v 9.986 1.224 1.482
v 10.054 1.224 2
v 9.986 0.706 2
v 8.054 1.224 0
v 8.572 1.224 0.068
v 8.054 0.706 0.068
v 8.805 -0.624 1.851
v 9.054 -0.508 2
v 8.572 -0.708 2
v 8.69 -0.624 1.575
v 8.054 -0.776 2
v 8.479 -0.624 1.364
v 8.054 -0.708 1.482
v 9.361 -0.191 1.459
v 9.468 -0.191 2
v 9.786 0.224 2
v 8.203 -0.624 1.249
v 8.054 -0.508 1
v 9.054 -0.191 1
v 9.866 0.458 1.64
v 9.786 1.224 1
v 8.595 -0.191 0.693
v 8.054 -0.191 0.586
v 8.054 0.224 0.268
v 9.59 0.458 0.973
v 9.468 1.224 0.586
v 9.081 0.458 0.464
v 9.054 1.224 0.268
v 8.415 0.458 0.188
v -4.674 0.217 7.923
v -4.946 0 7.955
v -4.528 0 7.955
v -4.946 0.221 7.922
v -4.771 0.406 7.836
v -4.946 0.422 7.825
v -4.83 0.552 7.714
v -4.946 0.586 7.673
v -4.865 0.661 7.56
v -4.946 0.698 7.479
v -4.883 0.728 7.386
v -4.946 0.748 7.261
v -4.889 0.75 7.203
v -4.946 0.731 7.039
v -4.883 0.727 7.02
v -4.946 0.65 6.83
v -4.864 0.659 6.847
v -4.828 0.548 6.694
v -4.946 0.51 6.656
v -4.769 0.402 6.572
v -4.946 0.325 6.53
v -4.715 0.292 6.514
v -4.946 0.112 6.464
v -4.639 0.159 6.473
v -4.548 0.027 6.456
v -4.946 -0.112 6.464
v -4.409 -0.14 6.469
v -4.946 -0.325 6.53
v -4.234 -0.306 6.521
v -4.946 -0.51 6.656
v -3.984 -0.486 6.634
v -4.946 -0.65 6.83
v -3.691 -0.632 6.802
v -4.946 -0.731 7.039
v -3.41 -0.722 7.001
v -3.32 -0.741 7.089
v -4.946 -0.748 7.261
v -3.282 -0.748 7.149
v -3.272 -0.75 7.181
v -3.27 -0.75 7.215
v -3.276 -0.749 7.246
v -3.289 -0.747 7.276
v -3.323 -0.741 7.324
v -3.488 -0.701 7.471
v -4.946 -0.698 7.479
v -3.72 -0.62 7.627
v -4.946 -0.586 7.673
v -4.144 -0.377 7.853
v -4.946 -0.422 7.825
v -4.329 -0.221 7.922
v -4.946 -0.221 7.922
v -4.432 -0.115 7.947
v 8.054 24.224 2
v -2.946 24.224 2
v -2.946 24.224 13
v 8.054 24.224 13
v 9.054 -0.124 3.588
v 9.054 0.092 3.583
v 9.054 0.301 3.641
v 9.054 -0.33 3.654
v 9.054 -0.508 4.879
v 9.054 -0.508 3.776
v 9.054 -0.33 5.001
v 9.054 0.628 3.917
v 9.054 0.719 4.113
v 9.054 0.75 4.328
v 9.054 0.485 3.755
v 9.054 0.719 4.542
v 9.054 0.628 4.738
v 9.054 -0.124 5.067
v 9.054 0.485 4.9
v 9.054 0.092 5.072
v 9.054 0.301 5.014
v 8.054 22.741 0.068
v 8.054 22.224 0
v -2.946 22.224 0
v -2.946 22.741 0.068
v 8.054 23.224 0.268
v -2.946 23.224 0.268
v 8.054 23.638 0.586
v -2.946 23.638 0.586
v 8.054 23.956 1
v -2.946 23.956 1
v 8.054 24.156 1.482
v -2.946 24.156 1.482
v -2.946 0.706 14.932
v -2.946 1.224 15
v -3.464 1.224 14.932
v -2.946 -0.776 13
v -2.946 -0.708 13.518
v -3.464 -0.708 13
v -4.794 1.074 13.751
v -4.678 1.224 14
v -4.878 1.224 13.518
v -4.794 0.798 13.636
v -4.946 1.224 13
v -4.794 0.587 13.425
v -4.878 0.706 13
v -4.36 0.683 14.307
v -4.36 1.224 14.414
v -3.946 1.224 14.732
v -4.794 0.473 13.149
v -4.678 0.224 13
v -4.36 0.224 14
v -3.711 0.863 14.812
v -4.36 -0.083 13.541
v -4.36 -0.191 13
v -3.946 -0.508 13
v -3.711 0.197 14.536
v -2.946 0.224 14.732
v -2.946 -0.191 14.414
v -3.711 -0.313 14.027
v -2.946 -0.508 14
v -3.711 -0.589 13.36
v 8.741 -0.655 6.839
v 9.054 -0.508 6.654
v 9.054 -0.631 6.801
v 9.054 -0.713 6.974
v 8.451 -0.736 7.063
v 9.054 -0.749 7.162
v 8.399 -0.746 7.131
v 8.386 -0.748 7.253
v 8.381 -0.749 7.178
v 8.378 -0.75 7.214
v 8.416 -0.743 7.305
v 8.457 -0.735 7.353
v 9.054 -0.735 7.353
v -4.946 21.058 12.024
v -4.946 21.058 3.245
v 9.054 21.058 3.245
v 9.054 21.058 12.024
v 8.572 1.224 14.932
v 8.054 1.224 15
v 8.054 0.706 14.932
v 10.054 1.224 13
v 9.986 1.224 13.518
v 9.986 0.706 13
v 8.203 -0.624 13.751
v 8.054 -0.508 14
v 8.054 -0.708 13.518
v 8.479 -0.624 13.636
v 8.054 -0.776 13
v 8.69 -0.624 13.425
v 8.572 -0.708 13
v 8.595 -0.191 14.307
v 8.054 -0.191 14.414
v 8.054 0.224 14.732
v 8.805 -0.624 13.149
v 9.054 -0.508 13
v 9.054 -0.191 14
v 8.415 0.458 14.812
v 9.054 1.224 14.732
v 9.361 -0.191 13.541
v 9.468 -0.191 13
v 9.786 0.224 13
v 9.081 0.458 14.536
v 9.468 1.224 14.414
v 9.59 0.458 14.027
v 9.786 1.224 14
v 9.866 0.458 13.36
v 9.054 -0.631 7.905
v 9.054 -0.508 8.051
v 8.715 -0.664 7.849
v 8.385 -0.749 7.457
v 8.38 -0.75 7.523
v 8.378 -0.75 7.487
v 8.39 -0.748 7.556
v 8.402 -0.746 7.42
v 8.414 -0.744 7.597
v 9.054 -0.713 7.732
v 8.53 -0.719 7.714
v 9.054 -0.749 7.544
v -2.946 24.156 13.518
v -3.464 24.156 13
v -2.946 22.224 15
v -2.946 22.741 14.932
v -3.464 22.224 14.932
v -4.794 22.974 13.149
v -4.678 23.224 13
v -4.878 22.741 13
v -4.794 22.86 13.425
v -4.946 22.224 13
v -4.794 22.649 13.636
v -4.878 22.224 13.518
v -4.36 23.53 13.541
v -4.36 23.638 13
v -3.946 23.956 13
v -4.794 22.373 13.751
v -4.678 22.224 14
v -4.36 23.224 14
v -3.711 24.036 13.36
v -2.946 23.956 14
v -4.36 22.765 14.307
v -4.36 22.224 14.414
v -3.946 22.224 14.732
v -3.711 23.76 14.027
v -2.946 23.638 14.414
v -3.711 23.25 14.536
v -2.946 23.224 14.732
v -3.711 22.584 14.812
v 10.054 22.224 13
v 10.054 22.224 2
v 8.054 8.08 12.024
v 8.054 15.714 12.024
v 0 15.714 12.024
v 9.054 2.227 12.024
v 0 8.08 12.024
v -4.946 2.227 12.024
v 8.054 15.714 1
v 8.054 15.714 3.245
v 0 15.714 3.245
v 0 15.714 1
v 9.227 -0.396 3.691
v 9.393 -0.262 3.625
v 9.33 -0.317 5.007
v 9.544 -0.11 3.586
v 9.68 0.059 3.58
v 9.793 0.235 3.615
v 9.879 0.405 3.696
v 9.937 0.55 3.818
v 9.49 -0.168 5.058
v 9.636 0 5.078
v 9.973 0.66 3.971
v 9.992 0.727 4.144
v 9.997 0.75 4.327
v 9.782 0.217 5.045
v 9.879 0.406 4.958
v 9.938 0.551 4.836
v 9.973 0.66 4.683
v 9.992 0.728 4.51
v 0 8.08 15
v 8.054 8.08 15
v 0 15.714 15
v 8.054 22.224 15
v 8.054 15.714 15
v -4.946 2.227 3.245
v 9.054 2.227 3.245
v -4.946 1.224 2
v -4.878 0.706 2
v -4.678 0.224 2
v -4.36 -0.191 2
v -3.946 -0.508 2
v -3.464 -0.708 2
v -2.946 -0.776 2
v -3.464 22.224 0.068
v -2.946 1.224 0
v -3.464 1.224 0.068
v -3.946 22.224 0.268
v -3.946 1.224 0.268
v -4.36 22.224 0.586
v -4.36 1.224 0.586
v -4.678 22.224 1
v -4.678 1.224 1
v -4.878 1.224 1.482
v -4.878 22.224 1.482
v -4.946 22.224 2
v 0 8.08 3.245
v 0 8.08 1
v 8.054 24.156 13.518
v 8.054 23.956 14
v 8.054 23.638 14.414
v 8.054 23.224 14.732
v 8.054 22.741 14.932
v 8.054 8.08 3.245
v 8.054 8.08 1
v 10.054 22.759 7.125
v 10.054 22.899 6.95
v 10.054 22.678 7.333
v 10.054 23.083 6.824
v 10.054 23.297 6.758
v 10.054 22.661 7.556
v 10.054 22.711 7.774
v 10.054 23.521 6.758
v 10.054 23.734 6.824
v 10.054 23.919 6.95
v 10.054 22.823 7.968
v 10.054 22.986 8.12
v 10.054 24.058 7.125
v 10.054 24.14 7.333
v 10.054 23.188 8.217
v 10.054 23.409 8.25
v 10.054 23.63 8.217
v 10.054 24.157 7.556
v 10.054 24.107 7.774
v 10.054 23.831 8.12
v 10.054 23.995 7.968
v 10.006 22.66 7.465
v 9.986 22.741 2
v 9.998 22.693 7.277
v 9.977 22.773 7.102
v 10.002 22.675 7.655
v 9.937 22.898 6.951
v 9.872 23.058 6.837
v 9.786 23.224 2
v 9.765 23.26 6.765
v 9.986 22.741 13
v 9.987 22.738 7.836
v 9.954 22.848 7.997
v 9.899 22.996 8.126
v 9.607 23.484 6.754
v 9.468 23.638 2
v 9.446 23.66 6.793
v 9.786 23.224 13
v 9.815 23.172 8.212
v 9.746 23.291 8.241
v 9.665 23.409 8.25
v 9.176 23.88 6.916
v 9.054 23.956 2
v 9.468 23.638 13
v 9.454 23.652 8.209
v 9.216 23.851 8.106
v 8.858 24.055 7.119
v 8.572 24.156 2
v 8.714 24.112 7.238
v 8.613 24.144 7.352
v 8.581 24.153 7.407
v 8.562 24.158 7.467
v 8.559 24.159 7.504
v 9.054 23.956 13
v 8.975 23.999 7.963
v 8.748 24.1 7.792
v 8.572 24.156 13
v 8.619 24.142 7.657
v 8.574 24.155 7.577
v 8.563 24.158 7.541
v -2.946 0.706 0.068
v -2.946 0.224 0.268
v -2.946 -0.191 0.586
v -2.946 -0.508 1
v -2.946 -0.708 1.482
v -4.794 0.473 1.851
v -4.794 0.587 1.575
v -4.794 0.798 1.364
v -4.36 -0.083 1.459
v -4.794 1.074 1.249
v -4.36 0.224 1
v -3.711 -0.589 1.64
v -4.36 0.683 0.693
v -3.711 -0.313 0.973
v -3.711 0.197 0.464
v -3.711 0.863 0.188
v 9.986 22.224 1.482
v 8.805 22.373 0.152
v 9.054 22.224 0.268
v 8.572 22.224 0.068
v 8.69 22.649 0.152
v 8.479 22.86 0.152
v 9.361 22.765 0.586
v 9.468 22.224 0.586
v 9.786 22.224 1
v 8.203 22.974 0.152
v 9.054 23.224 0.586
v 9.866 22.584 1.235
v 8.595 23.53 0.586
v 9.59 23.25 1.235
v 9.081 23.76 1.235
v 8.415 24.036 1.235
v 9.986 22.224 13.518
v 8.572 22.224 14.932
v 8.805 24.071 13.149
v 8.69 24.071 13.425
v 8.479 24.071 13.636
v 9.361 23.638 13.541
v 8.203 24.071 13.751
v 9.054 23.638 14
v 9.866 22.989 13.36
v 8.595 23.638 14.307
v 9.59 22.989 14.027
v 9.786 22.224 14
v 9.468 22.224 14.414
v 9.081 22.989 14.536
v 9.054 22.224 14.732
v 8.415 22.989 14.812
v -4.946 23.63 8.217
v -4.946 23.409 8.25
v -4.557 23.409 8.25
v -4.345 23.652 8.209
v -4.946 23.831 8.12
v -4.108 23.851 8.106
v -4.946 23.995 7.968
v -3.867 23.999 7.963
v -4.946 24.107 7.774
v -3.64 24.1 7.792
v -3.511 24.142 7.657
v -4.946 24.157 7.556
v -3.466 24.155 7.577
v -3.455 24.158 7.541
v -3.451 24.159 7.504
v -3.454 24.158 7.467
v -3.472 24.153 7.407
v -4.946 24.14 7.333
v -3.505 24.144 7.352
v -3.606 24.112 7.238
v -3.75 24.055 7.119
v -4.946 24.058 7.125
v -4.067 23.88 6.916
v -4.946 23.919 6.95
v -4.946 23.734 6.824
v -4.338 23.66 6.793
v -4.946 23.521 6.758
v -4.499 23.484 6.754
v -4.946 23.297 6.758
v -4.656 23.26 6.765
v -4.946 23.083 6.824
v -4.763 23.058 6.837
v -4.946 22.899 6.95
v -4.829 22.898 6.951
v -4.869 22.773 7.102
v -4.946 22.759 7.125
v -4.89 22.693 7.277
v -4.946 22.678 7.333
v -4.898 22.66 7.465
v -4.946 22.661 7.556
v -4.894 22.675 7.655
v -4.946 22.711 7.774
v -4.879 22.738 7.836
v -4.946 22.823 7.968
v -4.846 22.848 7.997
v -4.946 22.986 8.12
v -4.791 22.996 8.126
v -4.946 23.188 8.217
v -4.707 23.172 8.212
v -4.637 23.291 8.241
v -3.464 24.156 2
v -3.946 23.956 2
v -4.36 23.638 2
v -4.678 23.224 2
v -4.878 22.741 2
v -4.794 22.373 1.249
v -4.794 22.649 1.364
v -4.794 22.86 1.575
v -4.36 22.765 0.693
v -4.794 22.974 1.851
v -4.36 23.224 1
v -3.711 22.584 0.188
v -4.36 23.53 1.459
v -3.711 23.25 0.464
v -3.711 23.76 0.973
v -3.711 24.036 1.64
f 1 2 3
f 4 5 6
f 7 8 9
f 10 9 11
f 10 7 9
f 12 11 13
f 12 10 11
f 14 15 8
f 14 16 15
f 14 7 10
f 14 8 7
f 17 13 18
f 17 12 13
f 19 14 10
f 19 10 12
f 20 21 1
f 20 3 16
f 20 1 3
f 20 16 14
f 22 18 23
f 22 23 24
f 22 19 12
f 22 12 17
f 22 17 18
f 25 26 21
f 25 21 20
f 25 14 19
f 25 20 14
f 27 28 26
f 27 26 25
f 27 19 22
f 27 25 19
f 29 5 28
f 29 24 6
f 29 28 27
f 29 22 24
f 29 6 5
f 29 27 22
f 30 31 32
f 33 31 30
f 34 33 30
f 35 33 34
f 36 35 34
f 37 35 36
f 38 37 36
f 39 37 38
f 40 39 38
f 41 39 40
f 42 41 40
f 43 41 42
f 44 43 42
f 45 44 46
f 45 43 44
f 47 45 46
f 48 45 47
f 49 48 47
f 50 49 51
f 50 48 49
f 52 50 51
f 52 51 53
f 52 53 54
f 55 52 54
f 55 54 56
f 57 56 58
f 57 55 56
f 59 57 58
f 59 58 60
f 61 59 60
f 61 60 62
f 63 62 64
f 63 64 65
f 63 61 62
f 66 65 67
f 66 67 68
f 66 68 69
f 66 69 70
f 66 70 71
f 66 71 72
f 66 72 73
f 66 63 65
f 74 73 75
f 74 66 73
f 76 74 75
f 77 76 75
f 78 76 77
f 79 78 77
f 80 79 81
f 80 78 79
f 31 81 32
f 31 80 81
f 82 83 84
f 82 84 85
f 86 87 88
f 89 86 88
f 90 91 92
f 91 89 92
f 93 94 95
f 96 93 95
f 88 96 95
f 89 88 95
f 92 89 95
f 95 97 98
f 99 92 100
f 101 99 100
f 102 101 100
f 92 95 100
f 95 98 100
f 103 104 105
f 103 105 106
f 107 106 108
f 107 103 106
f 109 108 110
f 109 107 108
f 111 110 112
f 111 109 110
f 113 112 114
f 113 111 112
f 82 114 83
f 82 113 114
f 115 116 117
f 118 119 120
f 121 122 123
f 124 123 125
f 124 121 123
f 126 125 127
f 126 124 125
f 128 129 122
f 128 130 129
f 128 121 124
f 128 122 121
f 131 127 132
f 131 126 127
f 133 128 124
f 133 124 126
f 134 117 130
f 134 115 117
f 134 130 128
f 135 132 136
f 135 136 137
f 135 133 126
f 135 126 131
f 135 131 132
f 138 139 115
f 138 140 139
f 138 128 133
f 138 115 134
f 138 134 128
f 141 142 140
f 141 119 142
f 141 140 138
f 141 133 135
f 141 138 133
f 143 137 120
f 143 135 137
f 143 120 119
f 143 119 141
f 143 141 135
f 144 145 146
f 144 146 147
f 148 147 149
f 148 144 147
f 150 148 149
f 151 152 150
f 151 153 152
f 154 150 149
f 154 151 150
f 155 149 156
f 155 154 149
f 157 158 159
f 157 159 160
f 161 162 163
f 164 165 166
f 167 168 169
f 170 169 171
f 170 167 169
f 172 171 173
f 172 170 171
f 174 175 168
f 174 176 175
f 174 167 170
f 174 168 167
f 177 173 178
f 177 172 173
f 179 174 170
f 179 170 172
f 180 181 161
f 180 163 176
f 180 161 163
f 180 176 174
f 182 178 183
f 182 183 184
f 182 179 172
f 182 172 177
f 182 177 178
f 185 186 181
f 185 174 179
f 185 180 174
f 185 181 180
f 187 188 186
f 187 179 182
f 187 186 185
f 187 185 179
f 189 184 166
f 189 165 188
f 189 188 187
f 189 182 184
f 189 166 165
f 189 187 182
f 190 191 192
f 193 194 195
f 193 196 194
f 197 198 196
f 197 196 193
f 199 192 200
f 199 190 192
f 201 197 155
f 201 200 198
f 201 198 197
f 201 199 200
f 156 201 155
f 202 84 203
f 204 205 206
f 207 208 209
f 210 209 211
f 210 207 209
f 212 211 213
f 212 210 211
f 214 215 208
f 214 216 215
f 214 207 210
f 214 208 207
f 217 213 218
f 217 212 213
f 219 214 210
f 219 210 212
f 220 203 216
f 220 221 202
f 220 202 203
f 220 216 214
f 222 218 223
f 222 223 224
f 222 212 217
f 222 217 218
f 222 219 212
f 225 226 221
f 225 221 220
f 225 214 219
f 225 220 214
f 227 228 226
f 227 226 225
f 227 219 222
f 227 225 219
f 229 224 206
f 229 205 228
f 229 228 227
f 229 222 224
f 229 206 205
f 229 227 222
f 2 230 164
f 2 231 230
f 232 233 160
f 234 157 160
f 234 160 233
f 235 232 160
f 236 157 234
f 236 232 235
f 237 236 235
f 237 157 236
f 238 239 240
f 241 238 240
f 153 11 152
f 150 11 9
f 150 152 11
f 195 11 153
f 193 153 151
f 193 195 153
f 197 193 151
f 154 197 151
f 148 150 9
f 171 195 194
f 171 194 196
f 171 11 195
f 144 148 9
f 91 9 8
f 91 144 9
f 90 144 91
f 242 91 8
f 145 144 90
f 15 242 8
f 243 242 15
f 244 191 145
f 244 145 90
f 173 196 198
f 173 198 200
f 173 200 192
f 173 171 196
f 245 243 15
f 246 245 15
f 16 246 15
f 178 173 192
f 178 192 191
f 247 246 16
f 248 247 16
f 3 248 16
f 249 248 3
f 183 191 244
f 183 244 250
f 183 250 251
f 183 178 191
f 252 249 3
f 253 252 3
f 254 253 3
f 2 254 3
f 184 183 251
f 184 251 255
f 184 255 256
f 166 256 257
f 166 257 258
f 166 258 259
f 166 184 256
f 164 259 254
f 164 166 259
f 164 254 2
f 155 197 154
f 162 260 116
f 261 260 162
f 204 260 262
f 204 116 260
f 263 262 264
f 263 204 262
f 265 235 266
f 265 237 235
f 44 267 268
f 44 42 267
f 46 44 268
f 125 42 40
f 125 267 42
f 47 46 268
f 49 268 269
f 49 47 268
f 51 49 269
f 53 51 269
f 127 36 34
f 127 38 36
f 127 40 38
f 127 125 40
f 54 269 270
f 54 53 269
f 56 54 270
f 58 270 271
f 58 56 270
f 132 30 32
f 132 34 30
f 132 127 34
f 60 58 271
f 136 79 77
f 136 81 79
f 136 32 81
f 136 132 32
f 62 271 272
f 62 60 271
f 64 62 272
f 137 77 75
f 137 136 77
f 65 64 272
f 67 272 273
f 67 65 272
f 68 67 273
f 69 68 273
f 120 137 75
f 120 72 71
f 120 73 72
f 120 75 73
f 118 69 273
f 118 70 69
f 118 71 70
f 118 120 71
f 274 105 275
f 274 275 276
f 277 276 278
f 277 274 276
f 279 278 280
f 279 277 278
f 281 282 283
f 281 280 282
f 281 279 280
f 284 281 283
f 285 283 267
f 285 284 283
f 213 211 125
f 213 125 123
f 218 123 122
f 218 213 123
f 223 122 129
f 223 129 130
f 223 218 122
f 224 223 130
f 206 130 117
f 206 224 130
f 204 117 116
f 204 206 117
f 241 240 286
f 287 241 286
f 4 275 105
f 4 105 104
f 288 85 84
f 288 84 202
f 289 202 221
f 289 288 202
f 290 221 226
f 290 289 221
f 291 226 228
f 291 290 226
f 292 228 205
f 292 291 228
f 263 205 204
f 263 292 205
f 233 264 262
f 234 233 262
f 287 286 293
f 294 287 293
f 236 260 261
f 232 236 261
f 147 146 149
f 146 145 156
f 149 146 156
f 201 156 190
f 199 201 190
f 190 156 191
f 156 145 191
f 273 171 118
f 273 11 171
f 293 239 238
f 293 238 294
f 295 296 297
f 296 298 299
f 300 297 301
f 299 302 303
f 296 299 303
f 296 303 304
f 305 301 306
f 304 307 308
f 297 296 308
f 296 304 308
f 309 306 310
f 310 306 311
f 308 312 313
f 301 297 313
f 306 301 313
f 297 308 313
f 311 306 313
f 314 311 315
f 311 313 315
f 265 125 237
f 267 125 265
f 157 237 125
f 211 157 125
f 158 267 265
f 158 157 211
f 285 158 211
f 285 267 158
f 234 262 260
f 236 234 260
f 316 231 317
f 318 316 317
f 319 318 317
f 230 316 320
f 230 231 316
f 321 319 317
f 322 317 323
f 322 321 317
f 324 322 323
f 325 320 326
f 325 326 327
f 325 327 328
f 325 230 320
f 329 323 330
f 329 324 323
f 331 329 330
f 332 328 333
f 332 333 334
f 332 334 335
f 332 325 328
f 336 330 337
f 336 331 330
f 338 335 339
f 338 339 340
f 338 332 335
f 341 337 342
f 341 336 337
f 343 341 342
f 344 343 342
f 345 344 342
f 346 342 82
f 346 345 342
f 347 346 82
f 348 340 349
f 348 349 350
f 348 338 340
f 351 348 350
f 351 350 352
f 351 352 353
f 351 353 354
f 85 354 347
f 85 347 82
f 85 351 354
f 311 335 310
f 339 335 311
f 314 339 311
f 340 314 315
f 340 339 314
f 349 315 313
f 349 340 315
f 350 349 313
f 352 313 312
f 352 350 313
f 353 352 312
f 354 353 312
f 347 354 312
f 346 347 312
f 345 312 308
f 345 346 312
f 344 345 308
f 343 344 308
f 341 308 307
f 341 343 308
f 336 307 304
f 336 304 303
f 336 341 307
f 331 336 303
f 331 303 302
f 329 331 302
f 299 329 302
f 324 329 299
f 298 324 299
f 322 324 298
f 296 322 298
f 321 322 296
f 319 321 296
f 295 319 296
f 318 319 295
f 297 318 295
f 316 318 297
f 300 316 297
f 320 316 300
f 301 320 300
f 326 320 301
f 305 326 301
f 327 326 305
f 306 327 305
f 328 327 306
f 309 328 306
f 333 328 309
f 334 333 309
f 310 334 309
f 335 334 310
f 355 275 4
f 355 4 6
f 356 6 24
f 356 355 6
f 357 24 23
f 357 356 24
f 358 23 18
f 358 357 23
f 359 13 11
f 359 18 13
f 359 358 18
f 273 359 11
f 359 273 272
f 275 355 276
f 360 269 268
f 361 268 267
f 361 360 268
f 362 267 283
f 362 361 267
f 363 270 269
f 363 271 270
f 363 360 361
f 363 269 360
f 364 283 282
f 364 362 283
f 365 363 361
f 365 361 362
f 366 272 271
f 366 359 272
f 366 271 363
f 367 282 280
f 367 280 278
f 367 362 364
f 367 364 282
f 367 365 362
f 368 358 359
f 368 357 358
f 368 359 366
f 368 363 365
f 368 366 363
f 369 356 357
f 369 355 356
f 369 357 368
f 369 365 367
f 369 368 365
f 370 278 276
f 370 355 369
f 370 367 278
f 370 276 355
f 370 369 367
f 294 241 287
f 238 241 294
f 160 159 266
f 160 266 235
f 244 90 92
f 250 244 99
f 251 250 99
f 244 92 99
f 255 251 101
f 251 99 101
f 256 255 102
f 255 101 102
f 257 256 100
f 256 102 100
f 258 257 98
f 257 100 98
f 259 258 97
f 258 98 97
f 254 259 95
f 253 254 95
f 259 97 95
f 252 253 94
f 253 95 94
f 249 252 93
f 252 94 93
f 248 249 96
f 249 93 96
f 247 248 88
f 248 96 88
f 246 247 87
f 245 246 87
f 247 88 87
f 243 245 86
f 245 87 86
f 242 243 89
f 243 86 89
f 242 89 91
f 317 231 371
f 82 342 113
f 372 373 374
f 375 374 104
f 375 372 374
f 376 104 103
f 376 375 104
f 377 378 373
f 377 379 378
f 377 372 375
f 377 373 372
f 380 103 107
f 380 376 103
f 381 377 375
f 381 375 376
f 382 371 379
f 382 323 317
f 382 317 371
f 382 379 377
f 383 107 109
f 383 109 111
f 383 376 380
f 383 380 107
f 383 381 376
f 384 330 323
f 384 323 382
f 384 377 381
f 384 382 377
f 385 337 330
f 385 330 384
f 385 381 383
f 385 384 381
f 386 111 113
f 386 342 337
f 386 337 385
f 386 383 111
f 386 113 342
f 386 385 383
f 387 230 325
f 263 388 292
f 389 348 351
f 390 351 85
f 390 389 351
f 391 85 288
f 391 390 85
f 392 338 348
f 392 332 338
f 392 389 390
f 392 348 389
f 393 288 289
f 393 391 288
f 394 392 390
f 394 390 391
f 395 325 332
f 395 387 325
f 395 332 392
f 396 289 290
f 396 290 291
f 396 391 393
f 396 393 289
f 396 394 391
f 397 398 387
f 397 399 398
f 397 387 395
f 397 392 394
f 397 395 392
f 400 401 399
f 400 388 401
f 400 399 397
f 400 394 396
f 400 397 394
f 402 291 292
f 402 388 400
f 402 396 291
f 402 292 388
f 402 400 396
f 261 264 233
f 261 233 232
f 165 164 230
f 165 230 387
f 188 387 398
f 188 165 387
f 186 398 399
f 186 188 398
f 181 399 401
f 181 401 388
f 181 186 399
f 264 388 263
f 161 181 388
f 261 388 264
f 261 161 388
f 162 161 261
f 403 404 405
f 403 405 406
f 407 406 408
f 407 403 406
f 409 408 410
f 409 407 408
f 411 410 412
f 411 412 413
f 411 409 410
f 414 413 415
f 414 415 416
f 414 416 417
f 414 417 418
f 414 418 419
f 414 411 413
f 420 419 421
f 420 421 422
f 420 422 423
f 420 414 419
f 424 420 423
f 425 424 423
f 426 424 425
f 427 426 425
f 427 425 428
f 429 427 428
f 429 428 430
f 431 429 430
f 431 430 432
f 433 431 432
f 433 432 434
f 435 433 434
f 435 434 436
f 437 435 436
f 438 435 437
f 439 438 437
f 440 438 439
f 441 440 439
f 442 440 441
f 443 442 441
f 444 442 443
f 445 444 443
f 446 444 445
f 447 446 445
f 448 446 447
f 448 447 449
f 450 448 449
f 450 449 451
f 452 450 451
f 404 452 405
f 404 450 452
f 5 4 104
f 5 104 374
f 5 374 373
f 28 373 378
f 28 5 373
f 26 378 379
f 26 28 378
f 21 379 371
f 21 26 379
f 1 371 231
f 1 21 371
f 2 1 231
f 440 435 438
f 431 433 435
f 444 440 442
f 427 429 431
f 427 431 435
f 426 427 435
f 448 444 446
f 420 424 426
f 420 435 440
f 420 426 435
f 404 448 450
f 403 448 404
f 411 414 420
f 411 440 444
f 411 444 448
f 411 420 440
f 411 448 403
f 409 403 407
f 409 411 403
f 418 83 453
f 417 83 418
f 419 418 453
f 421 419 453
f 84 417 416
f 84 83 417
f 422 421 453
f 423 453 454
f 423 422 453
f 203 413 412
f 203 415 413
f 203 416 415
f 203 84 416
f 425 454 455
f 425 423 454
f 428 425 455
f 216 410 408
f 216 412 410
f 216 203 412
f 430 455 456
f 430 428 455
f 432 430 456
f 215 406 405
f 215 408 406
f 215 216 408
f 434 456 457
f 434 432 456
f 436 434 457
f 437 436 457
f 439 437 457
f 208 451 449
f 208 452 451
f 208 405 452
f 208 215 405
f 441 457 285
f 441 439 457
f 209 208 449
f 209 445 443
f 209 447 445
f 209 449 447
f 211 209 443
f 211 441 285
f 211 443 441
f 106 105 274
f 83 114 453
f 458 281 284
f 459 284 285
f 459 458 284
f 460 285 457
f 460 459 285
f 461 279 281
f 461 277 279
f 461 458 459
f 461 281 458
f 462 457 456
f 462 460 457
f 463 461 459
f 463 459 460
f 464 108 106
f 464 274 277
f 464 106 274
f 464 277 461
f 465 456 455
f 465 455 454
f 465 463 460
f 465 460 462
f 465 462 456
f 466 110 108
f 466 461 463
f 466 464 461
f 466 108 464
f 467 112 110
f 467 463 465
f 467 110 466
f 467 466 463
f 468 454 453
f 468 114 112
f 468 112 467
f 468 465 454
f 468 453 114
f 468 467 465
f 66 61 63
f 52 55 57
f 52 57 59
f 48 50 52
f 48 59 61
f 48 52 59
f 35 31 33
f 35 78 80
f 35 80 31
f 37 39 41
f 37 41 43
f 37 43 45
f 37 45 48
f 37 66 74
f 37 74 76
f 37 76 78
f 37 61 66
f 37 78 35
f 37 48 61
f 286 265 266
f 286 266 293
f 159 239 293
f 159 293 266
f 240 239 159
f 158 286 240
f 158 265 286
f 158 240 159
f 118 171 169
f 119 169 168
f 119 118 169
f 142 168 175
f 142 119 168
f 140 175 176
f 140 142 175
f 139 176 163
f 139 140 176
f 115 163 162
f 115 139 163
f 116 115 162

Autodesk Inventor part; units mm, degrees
ref_plane "YZ Plane" through (0, 0, 0) normal (1, 0, 0) x (0, 1, 0)
ref_plane "XZ Plane" through (0, 0, 0) normal (0, 1, 0) x (-1, 0, 0)
ref_plane "XY Plane" through (0, 0, 0) normal (0, 0, 1) x (1, 0, 0)
sketch "Sketch1" plane through (0, 0, 0) normal (0, 0, 1) x (1, 0, 0)
  line L0 (-4.9459, 24.2237) -> (10.0541, 24.2237)
  line L1 (10.0541, 24.2237) -> (10.0541, -0.7763)
  line L2 (10.0541, -0.7763) -> (-4.9459, -0.7763)
  line L3 (-4.9459, -0.7763) -> (-4.9459, 24.2237)
  point P0 (0, 0)
  dimension "d0" = 15
  dimension "d1" = 25
extrude "Extrusion1" add sketch "Sketch1" along normal blind 15
fillet "Fillet1" radius 2 12 edges at (10.0541, 11.7237, 15) (10.0541, 24.2237, 7.5) (10.0541, 11.7237, 0) (10.0541, -0.7763, 7.5) (2.5541, -0.7763, 15) (2.5541, 24.2237, 15) (2.5541, 24.2237, 0) (2.5541, -0.7763, 0) (-4.9459, 24.2237, 7.5) (-4.9459, 11.7237, 15) (-4.9459, -0.7763, 7.5) (-4.9459, 11.7237, 0)
sketch "Sketch2" plane through (-4.9459, 1.2237, 13) normal (-1, 0, 0) x (0, 0, 1)
  line L0 (-9.7554, 1.003) -> (-9.7554, 19.8346)
  line L1 (-11, 0) -> (-11, 21) projected
  line L2 (-9.7554, 19.8346) -> (-0.9757, 19.8346)
  line L3 (-0.9757, 19.8346) -> (-0.9757, 1.003)
  line L4 (-0.9757, 1.003) -> (-9.7554, 1.003)
  point P0 (-13, -1.2237)
extrude "Extrusion2" cut sketch "Sketch2" against normal blind 14
sketch "Sketch3" plane through (0, 0, 15) normal (0, 0, 1) x (1, 0, 0)
  line L0 (8.0541, 22.2237) -> (8.0541, 1.2237) projected
  line L1 (0, 8.0798) -> (8.0541, 8.0798)
  line L2 (8.0541, 8.0798) -> (8.0541, 15.7143)
  line L3 (8.0541, 15.7143) -> (0, 15.7143)
  line L4 (0, 15.7143) -> (0, 8.0798)
  point P0 (0, 0)
extrude "Extrusion3" cut sketch "Sketch3" against normal blind 14
sketch "Sketch4" plane through (-4.9459, 1.2237, 13) normal (-1, 0, 0) x (0, 0, 1)
  circle A0 centre (-5.5, 22.1852) radius 0.75
  point P0 (-13, -1.2237)
  dimension "d9" = 1.5
extrude "Extrusion4" add sketch "Sketch4" against normal blind 15
sketch "Sketch5" plane through (9.0541, 1.2237, 13) normal (-1, 0, 0) x (0, 0, 1)
  circle A0 centre (-8.6725, -1.2237) radius 0.75
  point P0 (-13, -1.2237)
  dimension "d12" = 1.5
extrude "Extrusion5" cut sketch "Sketch5" against normal blind 15
sketch "Sketch6" plane through (9.0541, 1.2237, 13) normal (-1, 0, 0) x (0, 0, 1)
  circle A0 centre (-5.5, -1.2237) radius 0.75
  point P0 (-13, -1.2237)
  dimension "d15" = 1.5
extrude "Extrusion6" add sketch "Sketch6" along normal blind 2
sketch "Sketch7" plane through (-4.9459, 2.2267, 12.0243) normal (0, 1, 0) x (1, 0, 0)
  point P0 (4.9459, 12.0243)
sketch "Sketch8" plane through (-4.9459, 1.2237, 13) normal (-1, 0, 0) x (0, 0, 1)
  circle A0 centre (-5.7946, -1.2237) radius 0.75
  point P0 (-13, -1.2237)
  dimension "d18" = 1.5
extrude "Extrusion7" add sketch "Sketch8" against normal blind 14
properties part number "F5"
